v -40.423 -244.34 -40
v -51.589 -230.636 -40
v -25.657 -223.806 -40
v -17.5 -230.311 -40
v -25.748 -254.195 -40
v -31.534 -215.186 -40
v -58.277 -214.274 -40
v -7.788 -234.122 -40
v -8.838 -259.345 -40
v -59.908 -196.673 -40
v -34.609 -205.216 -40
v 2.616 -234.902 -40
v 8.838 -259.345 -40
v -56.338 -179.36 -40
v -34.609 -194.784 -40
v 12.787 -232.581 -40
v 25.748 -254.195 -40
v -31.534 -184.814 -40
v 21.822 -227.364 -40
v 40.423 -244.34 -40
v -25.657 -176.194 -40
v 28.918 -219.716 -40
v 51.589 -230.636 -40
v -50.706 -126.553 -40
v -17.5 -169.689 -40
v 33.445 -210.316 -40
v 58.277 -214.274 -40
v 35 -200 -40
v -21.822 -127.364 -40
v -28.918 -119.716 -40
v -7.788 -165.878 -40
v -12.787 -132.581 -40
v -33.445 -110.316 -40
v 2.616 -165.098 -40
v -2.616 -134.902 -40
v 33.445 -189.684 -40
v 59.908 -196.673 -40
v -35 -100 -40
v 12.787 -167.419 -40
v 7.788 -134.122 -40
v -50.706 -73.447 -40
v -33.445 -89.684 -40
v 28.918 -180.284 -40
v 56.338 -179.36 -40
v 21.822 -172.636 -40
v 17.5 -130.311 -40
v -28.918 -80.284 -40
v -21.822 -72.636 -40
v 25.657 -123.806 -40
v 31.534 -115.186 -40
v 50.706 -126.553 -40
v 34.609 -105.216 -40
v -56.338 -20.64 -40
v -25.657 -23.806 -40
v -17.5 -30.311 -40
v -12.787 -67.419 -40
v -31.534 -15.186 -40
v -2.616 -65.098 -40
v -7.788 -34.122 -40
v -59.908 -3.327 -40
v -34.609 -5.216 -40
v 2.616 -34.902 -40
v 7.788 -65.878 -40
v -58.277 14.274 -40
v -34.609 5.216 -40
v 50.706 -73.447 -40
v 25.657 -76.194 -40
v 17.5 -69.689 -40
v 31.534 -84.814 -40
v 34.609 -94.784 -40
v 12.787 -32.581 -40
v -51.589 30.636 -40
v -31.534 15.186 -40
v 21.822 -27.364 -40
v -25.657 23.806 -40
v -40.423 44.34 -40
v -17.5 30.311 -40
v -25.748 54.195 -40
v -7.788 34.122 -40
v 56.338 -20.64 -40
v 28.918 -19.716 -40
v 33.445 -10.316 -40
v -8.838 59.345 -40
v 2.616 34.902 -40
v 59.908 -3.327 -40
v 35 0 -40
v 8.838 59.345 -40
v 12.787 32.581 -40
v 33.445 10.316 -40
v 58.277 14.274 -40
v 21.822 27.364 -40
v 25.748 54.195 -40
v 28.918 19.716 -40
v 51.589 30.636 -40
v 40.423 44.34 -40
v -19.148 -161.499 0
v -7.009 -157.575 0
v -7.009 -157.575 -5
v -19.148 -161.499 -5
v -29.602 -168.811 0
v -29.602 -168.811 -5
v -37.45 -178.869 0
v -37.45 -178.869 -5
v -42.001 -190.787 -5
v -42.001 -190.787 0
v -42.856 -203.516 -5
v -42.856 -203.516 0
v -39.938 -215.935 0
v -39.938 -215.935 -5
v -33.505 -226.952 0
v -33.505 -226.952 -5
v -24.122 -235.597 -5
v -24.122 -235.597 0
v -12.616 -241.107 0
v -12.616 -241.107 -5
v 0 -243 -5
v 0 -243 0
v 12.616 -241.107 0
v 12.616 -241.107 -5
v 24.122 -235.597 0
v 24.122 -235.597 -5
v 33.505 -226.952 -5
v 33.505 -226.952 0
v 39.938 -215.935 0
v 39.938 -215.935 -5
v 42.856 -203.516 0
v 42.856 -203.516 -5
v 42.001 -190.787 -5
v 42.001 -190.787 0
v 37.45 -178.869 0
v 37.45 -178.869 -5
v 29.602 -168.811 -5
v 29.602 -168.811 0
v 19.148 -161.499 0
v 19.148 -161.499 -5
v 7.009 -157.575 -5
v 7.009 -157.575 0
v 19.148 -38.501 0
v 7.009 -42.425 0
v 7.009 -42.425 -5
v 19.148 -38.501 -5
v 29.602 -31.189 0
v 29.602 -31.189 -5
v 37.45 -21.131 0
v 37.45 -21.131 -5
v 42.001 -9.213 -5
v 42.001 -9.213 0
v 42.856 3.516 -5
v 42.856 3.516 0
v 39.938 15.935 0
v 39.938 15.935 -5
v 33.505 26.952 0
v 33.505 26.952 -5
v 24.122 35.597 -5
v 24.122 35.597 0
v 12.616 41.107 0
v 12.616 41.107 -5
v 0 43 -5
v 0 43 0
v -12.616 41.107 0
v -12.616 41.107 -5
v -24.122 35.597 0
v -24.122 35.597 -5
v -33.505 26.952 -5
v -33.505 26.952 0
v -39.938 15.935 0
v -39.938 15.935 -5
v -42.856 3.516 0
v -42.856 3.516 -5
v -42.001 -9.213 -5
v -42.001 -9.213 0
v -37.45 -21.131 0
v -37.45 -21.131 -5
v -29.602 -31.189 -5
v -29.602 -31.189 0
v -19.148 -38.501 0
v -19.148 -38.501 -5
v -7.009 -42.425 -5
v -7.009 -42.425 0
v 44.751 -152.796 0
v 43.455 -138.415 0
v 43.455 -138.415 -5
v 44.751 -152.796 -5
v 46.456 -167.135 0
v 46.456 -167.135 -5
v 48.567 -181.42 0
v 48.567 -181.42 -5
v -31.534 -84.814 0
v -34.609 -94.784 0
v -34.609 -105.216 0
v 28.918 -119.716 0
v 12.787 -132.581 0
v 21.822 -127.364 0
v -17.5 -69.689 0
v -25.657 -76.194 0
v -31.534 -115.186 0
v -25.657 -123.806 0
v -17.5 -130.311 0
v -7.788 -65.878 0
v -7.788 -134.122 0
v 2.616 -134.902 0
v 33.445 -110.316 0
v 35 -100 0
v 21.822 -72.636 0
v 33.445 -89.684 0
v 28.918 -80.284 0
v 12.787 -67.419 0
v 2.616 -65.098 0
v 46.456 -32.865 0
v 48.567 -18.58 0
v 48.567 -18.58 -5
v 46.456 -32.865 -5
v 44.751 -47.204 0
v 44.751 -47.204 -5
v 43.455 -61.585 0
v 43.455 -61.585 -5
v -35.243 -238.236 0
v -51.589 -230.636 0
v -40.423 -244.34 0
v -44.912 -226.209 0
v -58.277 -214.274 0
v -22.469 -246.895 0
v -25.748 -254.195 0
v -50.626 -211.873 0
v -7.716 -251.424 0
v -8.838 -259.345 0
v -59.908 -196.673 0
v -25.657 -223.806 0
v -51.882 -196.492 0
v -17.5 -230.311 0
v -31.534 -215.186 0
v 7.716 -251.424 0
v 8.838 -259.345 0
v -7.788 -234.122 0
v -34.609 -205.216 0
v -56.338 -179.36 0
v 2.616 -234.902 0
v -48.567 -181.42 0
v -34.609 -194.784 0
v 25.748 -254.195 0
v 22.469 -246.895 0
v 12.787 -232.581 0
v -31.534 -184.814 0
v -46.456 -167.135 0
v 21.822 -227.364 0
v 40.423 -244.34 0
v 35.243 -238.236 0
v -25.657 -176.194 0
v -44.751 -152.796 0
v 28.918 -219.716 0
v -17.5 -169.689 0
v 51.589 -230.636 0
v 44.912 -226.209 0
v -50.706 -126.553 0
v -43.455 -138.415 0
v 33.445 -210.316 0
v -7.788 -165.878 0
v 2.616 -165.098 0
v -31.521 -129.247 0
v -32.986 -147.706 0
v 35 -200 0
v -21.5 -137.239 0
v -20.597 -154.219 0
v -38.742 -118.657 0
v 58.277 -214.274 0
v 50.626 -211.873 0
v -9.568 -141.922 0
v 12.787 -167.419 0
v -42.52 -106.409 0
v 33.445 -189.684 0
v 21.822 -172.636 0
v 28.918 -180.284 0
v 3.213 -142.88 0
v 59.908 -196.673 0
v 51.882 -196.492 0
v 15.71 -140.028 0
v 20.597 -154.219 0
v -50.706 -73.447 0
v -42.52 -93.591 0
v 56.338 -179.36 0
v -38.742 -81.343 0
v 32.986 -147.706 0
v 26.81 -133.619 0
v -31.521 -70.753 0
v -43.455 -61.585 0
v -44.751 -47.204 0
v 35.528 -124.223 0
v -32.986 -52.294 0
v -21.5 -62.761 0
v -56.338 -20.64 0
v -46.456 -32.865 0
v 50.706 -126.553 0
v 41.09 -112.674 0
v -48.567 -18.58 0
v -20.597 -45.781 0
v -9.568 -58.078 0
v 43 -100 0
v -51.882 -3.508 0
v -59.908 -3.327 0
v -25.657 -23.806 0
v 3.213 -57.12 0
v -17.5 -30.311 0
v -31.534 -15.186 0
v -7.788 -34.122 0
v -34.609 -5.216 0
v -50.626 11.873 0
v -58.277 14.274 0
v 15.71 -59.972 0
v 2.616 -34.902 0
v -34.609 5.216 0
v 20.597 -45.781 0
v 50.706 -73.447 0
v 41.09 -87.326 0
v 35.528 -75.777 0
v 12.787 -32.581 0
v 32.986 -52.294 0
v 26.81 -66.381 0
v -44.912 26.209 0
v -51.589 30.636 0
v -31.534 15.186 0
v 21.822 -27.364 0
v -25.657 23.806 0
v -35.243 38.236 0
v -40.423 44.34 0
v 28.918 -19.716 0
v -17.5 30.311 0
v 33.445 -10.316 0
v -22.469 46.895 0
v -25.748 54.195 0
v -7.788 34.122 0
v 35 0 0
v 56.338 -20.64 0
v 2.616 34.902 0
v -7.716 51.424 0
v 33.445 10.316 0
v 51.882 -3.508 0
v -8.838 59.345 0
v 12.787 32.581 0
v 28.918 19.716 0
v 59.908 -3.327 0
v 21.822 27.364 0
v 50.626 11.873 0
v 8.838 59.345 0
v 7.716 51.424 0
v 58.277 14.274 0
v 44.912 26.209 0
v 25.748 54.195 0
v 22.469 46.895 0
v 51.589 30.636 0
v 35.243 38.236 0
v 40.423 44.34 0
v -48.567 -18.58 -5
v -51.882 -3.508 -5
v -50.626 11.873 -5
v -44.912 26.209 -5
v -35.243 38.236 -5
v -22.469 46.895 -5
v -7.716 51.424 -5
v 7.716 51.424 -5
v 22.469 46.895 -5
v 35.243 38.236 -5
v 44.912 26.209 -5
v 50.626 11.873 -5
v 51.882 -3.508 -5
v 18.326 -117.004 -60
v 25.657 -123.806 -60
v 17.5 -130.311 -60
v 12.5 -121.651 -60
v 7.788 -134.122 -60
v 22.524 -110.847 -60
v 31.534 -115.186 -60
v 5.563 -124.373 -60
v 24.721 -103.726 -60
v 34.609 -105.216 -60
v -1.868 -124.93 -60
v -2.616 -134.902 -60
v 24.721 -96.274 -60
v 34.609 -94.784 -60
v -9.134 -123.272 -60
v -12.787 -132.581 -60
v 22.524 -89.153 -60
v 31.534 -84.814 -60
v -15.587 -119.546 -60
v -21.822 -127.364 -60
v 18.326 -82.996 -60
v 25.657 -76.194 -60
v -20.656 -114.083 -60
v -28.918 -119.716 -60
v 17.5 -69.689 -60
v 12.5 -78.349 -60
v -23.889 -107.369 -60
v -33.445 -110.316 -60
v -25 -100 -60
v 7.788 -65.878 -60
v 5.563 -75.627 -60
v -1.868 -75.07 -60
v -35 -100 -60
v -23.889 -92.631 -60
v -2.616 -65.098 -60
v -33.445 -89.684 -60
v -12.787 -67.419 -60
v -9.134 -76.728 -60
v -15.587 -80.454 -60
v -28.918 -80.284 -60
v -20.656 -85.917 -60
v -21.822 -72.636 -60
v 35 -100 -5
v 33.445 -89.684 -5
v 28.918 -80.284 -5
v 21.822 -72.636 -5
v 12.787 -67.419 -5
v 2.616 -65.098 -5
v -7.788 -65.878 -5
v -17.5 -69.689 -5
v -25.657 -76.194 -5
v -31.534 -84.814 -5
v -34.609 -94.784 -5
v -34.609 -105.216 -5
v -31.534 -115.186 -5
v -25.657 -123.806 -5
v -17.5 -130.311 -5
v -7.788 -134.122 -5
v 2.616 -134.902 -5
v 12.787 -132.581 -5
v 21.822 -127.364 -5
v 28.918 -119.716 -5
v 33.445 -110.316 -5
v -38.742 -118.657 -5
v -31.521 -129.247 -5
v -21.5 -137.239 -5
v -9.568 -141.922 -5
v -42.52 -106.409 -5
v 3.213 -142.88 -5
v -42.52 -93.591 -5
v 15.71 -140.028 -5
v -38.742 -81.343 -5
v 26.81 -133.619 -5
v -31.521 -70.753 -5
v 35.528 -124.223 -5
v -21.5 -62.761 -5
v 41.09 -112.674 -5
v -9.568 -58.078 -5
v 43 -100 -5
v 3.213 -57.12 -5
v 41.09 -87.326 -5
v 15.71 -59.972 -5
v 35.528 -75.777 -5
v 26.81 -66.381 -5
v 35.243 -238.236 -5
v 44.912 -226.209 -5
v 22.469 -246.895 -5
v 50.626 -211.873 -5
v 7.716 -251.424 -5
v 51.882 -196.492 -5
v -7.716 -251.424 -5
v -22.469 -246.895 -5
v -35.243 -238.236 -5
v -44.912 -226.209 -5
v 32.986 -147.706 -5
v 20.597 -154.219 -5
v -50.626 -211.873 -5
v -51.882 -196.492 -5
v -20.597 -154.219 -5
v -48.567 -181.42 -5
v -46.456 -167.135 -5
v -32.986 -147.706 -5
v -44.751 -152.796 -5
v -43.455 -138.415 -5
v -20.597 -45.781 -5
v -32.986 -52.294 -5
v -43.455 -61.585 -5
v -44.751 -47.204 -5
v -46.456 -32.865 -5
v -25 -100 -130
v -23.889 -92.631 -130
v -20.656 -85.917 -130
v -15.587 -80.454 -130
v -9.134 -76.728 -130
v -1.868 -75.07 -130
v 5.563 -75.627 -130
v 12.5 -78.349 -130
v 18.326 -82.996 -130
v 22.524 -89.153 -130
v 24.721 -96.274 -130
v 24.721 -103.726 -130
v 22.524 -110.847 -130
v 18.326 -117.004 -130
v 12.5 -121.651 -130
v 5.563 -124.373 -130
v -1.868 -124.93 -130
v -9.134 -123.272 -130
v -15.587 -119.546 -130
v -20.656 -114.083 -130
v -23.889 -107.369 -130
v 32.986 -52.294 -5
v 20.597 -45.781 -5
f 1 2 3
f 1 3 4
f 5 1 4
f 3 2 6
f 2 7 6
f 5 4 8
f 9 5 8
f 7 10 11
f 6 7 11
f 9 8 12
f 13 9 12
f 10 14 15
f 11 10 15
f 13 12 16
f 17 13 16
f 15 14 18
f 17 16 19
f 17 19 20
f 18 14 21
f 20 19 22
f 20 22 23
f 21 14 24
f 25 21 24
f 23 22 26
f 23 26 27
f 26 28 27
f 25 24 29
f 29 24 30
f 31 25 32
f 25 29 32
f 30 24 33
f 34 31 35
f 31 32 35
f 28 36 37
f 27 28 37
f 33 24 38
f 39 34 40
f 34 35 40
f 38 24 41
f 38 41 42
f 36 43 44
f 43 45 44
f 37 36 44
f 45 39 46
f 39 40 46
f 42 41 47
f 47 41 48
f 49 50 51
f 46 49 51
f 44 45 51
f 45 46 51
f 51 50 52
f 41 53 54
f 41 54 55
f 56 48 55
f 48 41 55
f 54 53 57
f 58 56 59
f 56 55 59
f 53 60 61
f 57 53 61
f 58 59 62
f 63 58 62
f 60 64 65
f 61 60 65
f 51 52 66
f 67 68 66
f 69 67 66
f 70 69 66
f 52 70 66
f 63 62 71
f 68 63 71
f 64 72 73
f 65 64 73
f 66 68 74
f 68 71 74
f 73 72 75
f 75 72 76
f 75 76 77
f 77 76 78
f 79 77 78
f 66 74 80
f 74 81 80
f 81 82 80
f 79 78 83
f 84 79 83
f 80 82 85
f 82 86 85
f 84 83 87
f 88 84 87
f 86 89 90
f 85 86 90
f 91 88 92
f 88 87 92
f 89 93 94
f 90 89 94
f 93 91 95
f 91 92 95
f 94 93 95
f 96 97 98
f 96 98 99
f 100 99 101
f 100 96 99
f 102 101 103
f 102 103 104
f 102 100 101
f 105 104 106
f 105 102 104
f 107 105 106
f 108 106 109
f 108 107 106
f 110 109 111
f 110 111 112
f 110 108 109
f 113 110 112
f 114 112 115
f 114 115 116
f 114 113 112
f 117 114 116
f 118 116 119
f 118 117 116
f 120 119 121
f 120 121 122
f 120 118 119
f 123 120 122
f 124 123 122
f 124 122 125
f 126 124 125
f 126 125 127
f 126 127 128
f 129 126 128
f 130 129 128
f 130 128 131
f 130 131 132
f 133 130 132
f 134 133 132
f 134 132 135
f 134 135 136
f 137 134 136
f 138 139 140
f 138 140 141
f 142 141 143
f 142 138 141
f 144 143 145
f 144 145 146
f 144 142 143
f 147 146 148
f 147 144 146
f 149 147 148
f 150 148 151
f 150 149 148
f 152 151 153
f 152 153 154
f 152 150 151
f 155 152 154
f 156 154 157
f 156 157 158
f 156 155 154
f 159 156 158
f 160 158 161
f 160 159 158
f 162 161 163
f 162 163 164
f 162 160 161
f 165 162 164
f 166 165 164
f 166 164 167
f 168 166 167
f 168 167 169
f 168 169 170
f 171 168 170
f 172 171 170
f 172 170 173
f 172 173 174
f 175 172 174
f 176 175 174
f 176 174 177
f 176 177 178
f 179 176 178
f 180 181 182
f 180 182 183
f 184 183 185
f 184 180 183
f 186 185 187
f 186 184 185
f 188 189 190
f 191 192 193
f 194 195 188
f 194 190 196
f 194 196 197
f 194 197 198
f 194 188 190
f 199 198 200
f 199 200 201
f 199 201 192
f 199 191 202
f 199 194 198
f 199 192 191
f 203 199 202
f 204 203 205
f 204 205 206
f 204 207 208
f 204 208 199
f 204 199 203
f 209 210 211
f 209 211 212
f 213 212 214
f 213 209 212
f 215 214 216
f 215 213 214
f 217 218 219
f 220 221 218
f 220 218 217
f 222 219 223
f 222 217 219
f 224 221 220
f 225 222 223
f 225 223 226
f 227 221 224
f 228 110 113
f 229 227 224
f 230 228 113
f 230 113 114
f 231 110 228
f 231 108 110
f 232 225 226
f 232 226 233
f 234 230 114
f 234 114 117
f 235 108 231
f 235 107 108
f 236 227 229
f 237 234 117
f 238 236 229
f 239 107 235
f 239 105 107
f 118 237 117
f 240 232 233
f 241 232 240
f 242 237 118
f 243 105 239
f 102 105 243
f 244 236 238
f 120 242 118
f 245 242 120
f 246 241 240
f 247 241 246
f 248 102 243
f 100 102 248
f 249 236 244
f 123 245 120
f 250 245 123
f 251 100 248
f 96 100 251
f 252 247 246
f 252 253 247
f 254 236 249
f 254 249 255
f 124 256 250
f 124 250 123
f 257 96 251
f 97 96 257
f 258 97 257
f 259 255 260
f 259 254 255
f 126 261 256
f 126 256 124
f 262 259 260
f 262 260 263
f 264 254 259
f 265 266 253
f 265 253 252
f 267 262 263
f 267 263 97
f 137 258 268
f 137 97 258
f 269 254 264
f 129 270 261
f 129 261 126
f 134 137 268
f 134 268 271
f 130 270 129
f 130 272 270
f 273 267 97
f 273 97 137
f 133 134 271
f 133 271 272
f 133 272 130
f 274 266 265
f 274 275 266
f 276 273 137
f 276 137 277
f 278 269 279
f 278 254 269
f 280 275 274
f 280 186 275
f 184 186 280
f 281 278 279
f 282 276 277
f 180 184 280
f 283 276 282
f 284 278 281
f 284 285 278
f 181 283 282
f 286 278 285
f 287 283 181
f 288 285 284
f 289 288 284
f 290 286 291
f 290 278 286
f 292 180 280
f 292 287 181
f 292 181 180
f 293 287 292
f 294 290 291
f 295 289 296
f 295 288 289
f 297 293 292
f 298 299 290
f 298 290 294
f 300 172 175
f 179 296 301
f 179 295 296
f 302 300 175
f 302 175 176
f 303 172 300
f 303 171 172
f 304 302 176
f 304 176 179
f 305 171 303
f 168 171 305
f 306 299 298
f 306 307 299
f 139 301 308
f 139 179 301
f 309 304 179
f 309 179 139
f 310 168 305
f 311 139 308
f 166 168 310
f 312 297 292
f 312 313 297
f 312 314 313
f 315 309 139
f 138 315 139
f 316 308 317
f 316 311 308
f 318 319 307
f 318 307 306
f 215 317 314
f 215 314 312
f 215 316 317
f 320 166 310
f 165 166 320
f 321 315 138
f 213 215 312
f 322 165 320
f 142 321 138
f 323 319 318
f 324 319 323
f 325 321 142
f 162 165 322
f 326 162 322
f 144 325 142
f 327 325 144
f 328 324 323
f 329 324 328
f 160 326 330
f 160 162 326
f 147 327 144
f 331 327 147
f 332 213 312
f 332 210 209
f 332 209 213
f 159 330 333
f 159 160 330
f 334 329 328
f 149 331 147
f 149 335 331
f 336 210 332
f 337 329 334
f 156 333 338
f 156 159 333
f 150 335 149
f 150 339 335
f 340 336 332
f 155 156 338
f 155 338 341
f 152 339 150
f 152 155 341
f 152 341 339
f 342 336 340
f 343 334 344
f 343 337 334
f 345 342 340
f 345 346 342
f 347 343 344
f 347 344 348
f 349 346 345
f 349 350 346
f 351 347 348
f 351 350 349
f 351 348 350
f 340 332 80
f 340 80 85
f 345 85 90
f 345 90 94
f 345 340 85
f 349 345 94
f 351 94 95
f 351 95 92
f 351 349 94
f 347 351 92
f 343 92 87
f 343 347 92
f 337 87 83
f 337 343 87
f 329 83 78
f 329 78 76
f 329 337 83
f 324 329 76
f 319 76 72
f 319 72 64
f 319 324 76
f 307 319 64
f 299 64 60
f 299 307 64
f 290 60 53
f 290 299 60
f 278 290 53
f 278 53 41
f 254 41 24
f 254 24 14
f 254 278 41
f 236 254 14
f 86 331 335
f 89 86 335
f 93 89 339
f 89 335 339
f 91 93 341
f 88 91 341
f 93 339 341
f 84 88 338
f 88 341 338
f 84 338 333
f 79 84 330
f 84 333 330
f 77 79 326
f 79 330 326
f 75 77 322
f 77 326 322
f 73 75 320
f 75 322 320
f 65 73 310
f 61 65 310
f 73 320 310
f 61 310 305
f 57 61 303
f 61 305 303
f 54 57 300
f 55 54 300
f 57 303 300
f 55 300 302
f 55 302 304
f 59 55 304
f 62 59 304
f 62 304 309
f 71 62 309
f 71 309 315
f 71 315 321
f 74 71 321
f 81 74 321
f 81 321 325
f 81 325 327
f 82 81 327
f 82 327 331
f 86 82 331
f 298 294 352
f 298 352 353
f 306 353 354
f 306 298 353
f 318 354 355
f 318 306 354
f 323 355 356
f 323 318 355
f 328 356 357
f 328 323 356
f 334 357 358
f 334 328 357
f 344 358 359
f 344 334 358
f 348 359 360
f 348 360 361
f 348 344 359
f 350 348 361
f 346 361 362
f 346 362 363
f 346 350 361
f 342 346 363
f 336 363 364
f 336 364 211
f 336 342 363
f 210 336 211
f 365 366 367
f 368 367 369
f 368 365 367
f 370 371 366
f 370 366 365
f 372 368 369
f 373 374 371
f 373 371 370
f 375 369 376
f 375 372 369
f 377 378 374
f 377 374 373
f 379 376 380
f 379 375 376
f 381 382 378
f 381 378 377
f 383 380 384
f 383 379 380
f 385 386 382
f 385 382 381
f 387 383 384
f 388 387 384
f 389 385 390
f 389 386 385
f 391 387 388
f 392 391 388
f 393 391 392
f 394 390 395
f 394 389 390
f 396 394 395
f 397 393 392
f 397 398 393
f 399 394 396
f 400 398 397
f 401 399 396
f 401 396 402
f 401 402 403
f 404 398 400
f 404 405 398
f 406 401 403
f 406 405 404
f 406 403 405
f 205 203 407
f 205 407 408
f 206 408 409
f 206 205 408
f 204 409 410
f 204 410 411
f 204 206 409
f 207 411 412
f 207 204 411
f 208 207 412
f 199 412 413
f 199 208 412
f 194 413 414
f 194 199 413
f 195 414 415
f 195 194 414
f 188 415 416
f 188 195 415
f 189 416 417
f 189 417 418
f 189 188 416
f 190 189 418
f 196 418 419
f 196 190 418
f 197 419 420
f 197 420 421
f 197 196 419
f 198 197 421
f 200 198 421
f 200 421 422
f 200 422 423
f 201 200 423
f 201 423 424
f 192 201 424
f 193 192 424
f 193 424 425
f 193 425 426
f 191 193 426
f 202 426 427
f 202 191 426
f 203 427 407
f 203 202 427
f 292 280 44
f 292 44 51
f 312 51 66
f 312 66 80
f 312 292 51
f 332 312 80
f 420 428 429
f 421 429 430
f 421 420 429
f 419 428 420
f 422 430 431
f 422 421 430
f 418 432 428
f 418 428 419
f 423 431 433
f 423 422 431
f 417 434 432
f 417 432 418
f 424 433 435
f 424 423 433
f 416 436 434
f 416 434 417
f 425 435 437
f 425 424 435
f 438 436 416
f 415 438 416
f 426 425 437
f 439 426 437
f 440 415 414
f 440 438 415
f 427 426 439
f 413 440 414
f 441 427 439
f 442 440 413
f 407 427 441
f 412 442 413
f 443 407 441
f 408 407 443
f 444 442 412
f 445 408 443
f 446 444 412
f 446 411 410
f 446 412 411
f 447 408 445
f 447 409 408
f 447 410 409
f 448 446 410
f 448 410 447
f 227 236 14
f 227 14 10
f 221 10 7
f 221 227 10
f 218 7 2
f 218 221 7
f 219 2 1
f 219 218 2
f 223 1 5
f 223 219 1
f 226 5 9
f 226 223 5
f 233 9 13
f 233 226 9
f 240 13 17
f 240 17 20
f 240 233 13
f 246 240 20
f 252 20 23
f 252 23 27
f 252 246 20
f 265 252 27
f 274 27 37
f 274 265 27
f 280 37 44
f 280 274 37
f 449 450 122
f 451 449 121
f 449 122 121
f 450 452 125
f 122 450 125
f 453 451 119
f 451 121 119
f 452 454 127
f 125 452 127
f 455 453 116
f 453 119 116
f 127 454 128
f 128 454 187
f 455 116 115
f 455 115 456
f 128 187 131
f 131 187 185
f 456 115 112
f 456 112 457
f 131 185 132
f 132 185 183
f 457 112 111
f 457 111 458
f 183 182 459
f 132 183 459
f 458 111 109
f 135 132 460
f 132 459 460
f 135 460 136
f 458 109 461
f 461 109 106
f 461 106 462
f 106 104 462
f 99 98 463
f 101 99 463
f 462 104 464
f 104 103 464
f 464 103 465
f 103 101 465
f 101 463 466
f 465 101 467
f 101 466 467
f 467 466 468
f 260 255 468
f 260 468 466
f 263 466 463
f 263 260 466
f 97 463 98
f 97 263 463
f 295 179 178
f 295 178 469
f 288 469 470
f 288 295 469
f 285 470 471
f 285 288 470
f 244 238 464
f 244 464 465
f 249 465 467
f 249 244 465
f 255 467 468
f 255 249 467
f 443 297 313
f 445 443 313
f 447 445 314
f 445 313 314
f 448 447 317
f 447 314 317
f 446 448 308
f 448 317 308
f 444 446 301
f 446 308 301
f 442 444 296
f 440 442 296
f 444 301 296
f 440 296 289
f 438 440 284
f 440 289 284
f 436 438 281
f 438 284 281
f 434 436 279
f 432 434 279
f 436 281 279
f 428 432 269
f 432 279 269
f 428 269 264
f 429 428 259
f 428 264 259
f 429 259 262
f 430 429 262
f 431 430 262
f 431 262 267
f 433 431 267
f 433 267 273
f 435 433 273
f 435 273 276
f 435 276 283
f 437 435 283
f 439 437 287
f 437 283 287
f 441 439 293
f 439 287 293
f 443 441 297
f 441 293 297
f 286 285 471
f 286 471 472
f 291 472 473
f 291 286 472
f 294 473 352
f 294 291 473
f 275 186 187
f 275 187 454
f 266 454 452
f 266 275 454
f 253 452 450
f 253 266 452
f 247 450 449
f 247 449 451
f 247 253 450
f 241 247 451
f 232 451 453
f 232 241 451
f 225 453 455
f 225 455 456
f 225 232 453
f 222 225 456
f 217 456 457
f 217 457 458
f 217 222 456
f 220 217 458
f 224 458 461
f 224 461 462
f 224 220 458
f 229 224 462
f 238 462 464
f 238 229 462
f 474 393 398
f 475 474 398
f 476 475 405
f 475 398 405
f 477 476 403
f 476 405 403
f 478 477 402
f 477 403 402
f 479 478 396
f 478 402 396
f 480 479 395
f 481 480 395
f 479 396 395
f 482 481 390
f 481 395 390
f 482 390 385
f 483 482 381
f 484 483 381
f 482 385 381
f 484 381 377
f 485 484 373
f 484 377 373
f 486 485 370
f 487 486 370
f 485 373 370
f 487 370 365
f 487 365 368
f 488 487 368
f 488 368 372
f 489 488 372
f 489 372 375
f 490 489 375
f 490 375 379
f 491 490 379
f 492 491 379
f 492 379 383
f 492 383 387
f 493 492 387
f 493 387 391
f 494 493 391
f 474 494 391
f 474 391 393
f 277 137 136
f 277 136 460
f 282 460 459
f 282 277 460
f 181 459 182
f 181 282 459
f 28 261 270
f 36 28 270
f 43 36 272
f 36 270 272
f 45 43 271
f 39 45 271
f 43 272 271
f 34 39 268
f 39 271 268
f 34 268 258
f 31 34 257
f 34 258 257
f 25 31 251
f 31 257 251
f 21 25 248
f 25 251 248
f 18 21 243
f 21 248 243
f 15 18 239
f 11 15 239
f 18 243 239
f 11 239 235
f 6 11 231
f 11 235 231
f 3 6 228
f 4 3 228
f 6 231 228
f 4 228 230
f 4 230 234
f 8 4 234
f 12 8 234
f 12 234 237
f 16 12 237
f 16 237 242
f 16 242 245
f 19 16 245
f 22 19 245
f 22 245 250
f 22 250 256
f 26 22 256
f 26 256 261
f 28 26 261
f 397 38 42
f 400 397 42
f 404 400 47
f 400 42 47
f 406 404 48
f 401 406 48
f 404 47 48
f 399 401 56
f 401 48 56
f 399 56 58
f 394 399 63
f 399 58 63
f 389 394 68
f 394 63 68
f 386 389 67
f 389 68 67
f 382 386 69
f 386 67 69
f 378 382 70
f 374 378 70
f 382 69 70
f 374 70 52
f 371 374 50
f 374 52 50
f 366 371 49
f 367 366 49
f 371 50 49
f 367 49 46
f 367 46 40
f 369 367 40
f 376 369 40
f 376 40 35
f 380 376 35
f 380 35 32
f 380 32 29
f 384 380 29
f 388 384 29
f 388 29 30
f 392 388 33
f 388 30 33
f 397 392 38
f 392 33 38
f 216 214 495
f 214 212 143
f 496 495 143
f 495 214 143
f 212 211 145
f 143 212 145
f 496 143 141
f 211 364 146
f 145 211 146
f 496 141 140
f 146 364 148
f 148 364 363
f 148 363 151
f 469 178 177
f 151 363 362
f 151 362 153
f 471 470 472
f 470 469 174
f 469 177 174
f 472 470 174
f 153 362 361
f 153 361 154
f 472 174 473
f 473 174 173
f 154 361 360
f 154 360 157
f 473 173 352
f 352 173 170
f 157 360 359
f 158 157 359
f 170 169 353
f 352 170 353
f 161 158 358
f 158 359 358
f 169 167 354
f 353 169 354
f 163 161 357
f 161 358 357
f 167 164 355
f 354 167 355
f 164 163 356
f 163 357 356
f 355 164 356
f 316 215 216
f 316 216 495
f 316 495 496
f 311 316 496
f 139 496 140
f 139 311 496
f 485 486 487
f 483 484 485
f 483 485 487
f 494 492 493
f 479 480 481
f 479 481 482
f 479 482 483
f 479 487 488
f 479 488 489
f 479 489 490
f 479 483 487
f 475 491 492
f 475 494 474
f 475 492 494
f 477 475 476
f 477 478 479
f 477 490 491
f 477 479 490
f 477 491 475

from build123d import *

# Parameters (mm, degrees)
BOSS_EXTRUDE1_DEPTH     = 40
SKETCH2_R               = 43
SKETCH2_R_2             = 35
CUT_EXTRUDE1_DEPTH      = 5
SKETCH2_5_R             = 35
CUT_EXTRUDE2_DEPTH      = 1
CUT_EXTRUDE2_DEPTH_BACK = 41
SKETCH4_R               = 35
BOSS_EXTRUDE3_DEPTH     = 20
SKETCH4_4_R             = 25
BOSS_EXTRUDE4_DEPTH     = 90


with BuildPart() as part:
    # Sketch1 → Boss-Extrude1 (new body)
    with BuildSketch(Plane.XY):
        with BuildLine():
            ThreePointArc((56.338184709, -20.639984102), (0, 60), (-56.338184709, -20.639984102))
            ThreePointArc((-56.338184709, -20.639984102), (-50, -100), (-56.338184709, -179.360015898))
            ThreePointArc((-56.338184709, -179.360015898), (0, -260), (56.338184709, -179.360015898))
            ThreePointArc((56.338184709, -179.360015898), (50, -100), (56.338184709, -20.639984102))
        make_face()
    extrude(amount=-BOSS_EXTRUDE1_DEPTH)

    # Sketch2 → Cut-Extrude1 (cut)
    with BuildSketch(Plane.XY):
        with Locations((0, -100)):
            Circle(SKETCH2_R)
        with Locations((0, -100)):
            Circle(SKETCH2_R_2, mode=Mode.SUBTRACT)
        with BuildLine():
            ThreePointArc((7.008521599, -42.425), (0, 43), (-7.008521599, -42.425))
            ThreePointArc((-7.008521599, -42.425), (-26.989032945, -48.661981917), (-43.454545455, -61.585126847))
            ThreePointArc((-43.454545455, -61.585126847), (-45.552404101, -40.028148339), (-48.567238975, -18.580185639))
            ThreePointArc((-48.567238975, -18.580185639), (0, 52), (48.567238975, -18.580185639))
            ThreePointArc((48.567238975, -18.580185639), (45.552404101, -40.028148339), (43.454545455, -61.585126847))
            ThreePointArc((43.454545455, -61.585126847), (26.989032945, -48.661981917), (7.008521599, -42.425))
        make_face()
        with BuildLine():
            ThreePointArc((7.008521599, -157.575), (26.989032945, -151.338018083), (43.454545455, -138.414873153))
            ThreePointArc((43.454545455, -138.414873153), (45.552404101, -159.971851661), (48.567238975, -181.419814361))
            ThreePointArc((48.567238975, -181.419814361), (0, -252), (-48.567238975, -181.419814361))
            ThreePointArc((-48.567238975, -181.419814361), (-45.552404101, -159.971851661), (-43.454545455, -138.414873153))
            ThreePointArc((-43.454545455, -138.414873153), (-26.989032945, -151.338018083), (-7.008521599, -157.575))
            ThreePointArc((-7.008521599, -157.575), (0, -243), (7.008521599, -157.575))
        make_face()
    extrude(amount=-CUT_EXTRUDE1_DEPTH, mode=Mode.SUBTRACT)

    # Sketch2<5> → Cut-Extrude2 (cut, two sides)
    with BuildSketch(Plane.XY) as cut_extrude2_sk:
        Circle(SKETCH2_5_R)
        with Locations((0, -200)):
            Circle(SKETCH2_5_R)
    extrude(amount=CUT_EXTRUDE2_DEPTH, mode=Mode.SUBTRACT)
    extrude(cut_extrude2_sk.sketch, amount=-CUT_EXTRUDE2_DEPTH_BACK, mode=Mode.SUBTRACT)

    # Sketch4 → Boss-Extrude3 (add)
    with BuildSketch(Plane(origin=(0, 0, -40), x_dir=(-1, 0, 0), z_dir=(0, 0, -1))):
        with Locations((0, -100)):
            Circle(SKETCH4_R)
    extrude(amount=BOSS_EXTRUDE3_DEPTH)

    # Sketch4<4> → Boss-Extrude4 (add)
    with BuildSketch(Plane(origin=(0, 0, -40), x_dir=(-1, 0, 0), z_dir=(0, 0, -1))):
        with Locations((0, -100)):
            Circle(SKETCH4_4_R)
    extrude(amount=BOSS_EXTRUDE4_DEPTH)


solid = part.part
